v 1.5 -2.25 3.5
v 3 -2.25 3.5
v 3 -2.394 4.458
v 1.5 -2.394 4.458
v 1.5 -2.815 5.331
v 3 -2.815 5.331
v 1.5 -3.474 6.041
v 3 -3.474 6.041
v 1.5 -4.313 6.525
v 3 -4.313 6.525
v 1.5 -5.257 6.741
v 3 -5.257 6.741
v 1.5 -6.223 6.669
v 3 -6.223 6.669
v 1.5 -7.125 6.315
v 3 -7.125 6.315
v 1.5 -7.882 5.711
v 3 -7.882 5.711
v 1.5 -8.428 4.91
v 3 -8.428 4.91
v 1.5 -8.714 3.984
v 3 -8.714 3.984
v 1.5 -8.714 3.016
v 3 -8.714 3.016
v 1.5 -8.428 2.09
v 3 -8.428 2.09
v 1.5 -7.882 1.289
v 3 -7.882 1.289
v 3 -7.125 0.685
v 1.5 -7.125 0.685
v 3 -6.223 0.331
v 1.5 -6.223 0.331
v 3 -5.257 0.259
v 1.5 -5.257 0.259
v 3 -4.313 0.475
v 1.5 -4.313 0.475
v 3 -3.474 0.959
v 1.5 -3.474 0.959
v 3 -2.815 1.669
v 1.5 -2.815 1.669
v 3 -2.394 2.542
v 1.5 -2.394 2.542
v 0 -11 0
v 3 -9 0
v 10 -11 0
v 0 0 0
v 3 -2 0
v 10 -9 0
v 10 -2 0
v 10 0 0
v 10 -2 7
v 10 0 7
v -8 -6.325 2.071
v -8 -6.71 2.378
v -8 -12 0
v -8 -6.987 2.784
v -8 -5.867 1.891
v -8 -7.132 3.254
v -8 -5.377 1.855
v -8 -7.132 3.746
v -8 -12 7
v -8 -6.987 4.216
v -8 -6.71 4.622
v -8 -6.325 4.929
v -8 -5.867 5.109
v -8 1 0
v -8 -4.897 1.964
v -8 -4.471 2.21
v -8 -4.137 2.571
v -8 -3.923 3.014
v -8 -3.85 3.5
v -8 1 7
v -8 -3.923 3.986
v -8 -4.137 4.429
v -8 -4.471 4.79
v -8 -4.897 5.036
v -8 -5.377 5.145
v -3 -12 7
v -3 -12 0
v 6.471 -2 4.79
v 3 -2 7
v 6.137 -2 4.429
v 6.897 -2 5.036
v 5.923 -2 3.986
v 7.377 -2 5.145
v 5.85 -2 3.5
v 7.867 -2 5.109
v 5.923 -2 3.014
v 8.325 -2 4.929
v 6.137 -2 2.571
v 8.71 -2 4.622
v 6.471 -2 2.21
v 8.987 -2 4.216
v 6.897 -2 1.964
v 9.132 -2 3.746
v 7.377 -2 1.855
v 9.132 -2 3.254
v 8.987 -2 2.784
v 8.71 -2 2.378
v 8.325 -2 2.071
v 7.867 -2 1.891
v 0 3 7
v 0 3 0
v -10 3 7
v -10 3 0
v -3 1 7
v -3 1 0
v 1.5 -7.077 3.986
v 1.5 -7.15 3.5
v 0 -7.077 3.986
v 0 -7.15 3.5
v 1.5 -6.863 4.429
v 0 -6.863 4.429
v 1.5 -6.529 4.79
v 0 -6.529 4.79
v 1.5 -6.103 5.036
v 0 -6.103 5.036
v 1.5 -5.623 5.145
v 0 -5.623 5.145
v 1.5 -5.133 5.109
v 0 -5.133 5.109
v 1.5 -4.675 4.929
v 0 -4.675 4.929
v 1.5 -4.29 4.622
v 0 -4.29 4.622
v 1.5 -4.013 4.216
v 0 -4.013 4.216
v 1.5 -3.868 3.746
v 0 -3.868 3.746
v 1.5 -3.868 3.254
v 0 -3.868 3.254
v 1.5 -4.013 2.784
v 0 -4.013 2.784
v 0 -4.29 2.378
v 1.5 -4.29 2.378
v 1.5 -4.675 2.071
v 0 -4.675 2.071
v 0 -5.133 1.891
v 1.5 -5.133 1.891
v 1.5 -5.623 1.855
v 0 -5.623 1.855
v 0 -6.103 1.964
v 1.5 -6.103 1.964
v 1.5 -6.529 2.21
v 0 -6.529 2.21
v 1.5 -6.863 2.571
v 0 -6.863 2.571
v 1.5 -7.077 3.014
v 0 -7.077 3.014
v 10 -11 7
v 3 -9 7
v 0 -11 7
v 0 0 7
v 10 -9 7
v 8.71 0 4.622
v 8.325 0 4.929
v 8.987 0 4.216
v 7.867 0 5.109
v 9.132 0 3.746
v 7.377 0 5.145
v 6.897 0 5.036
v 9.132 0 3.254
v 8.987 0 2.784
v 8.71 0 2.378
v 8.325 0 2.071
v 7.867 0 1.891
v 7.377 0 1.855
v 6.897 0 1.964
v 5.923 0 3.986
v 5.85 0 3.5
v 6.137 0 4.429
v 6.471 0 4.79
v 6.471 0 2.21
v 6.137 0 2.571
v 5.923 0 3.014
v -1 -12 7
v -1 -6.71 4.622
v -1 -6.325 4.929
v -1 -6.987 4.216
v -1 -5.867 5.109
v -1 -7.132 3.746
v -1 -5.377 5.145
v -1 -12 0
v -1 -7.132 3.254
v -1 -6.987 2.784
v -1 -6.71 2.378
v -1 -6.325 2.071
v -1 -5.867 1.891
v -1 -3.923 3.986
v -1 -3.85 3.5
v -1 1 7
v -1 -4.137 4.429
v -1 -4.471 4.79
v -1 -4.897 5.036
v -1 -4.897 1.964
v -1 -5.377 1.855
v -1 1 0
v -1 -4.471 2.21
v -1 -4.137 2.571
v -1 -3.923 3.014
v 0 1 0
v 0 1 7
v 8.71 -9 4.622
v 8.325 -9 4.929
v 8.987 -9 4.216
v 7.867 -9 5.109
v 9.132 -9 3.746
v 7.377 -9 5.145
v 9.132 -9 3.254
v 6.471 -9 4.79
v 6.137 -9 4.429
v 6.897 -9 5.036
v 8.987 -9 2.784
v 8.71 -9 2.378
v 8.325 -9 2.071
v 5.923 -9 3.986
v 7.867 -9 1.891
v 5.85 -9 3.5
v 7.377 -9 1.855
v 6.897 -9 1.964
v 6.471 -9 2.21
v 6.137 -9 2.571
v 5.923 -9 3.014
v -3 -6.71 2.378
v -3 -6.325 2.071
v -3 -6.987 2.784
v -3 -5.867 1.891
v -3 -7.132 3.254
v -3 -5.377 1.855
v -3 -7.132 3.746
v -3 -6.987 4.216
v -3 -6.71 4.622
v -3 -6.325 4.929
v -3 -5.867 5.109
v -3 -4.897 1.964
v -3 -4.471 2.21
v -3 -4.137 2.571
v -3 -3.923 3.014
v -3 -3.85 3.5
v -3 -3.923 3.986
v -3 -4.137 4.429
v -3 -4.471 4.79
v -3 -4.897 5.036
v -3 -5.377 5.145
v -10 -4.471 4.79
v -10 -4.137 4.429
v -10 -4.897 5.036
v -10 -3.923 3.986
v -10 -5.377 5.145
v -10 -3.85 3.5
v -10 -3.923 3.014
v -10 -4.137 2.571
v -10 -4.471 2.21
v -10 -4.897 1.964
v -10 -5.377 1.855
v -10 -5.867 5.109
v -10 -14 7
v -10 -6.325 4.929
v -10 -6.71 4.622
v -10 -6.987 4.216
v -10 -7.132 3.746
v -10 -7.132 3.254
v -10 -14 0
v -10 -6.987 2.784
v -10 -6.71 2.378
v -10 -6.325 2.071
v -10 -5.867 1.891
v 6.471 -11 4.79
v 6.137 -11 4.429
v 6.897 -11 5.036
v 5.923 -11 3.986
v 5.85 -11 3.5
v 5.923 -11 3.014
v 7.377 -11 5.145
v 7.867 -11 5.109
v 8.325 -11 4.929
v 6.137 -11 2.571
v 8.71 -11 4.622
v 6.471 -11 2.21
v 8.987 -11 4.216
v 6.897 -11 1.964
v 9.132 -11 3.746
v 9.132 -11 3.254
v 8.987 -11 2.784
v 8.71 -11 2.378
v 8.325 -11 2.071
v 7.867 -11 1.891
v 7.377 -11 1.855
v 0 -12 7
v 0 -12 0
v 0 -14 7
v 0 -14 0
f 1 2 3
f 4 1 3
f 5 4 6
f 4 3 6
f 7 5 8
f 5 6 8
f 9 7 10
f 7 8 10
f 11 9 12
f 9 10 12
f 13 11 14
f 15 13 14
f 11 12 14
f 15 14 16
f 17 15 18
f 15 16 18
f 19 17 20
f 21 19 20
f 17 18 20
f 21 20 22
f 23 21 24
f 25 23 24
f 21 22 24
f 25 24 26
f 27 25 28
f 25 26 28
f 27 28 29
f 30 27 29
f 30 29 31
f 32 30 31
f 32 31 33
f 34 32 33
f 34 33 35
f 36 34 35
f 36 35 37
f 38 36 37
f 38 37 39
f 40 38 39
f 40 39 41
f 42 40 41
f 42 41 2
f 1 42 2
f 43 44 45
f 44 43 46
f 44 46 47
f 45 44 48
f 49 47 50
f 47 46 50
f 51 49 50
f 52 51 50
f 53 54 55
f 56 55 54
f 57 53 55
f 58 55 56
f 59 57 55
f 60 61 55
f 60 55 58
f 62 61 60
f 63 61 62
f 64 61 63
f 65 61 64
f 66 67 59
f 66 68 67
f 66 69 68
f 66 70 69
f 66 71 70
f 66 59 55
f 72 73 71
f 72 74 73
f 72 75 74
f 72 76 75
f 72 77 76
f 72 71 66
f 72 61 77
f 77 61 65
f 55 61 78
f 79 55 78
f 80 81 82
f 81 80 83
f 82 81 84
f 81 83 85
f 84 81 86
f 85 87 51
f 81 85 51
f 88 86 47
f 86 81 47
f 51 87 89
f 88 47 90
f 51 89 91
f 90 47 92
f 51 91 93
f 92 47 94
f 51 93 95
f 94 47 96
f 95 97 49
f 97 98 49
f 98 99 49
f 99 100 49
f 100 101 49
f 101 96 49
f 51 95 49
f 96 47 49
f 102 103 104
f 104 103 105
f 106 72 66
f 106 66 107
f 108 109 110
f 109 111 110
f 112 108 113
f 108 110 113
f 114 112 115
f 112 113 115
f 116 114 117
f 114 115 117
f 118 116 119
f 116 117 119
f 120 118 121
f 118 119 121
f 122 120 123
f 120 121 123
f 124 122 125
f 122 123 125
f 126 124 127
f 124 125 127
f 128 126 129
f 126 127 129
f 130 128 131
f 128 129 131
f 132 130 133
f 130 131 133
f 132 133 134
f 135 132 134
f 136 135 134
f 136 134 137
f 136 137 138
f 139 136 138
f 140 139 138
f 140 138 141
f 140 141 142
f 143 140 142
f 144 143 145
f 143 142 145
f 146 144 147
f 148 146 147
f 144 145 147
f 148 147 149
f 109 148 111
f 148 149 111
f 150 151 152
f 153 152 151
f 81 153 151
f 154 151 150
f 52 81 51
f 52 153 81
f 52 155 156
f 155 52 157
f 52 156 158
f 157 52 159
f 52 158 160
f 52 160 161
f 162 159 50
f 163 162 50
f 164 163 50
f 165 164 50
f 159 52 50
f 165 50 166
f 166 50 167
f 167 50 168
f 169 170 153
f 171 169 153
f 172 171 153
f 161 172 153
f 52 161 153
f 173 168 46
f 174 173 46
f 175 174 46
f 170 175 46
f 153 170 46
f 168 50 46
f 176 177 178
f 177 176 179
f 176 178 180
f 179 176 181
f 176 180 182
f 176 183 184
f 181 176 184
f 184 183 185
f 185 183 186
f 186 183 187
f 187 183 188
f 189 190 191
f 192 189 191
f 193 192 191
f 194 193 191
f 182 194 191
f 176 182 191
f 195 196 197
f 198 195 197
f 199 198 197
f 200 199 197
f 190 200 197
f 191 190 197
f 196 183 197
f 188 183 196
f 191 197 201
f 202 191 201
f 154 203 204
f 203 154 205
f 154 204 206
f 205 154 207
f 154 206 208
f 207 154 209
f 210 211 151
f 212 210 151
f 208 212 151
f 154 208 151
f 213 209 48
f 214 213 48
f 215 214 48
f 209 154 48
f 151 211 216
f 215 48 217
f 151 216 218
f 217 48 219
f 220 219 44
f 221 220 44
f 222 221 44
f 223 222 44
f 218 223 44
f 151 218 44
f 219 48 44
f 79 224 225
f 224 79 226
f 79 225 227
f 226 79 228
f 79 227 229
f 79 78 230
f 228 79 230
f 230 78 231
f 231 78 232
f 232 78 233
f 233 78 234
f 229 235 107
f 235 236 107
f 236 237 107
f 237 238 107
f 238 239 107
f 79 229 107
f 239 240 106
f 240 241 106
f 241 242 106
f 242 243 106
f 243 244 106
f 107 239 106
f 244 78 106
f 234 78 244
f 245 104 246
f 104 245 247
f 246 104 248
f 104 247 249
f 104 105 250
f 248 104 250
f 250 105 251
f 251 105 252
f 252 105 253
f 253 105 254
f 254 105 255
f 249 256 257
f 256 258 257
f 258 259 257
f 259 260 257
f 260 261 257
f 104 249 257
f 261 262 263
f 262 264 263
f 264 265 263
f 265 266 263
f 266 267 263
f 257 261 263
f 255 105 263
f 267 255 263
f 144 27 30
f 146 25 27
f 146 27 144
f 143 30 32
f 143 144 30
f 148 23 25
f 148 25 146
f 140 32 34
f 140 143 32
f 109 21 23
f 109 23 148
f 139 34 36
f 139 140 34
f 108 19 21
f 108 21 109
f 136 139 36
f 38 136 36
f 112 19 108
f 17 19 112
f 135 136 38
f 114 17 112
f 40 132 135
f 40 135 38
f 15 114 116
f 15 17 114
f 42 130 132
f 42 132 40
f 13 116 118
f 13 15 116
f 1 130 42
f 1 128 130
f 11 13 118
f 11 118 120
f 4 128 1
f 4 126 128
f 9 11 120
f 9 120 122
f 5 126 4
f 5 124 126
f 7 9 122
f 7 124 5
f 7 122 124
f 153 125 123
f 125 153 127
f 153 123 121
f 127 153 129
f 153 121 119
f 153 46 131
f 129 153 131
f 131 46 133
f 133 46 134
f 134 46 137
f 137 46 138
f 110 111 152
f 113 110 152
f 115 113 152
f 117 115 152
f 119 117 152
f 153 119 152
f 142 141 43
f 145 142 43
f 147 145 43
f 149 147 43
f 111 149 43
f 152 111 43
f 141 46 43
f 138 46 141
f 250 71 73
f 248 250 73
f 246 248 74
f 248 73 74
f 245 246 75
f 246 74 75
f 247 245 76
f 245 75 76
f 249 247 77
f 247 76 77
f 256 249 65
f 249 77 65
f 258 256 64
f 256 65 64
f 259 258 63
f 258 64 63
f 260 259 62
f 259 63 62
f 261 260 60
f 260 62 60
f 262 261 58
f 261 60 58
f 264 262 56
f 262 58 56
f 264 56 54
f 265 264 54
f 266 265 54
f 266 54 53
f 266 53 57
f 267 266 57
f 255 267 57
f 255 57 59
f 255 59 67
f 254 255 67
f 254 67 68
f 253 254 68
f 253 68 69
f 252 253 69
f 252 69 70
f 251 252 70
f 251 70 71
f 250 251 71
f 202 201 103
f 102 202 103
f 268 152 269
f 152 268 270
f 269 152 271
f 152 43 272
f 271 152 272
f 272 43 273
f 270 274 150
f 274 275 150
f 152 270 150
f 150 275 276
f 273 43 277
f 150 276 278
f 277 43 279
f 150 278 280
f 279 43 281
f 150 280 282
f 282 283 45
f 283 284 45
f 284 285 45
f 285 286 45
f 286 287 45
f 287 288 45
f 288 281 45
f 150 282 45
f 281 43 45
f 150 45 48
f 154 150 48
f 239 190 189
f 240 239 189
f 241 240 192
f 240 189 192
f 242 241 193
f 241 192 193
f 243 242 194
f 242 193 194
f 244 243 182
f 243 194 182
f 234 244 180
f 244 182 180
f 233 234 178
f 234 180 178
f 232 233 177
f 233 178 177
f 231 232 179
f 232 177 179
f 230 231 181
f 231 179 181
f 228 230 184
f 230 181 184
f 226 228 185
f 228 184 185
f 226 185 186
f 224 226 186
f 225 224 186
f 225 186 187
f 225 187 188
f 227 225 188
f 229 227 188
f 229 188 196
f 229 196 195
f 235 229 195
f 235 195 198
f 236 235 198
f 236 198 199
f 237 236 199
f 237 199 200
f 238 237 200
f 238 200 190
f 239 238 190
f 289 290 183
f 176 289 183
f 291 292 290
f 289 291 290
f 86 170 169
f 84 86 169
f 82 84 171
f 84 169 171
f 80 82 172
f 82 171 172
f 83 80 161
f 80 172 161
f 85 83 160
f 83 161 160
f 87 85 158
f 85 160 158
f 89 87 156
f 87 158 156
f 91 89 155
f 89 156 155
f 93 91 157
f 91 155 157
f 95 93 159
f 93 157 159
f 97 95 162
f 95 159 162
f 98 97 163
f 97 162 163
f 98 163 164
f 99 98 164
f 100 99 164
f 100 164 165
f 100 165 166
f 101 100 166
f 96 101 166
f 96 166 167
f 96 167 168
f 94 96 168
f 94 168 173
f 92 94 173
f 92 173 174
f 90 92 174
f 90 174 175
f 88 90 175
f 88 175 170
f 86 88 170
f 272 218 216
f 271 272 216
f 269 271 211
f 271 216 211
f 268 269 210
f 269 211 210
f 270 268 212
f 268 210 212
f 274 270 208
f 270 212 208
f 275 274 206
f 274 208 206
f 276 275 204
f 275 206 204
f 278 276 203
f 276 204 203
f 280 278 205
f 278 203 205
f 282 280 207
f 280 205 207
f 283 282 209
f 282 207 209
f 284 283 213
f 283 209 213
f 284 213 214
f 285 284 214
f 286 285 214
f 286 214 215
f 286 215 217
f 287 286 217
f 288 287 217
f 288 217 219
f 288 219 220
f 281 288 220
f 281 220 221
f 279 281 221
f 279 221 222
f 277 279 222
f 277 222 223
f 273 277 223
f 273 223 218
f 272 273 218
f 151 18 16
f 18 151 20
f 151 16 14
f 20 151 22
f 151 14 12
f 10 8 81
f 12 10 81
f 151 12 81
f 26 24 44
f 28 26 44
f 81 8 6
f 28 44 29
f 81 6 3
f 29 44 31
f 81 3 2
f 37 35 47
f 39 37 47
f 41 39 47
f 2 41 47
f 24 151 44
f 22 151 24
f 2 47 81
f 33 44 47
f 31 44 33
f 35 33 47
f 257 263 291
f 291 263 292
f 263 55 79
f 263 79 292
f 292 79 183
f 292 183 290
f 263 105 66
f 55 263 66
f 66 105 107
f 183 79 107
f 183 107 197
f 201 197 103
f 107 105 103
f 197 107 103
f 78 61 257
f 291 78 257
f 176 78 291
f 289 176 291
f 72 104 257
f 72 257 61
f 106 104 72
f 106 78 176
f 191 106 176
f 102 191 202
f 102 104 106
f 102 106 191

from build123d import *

# Parameters (mm, degrees)
F1_DEPTH       = 7
F3_D           = 3.3
F5_D           = 3.3
F5_CBORE_D     = 6.5
F5_CBORE_DEPTH = 1.5
F7_DEPTH       = 7
F8_W           = 5
F8_H           = 13
F9_DEPTH       = 7.001
F11_D          = 3.3


with BuildPart() as f1:
    # F0 (on Top) → F1 (new body)
    with BuildSketch(Plane.XY):
        Polygon((10, 0), (0, 0), (0, -11), (10, -11), (10, -9), (3, -9), (3, -2), (10, -2), align=None)
    extrude(amount=F1_DEPTH)

    # F3 (through all)
    with Locations(Plane.XZ.offset(11)):
        with Locations((7.5, 3.5)):
            Hole(F3_D / 2)

    # F5 (through all)
    with Locations(Plane.YZ.offset(3)):
        with Locations((-5.5, 3.5)):
            CounterBoreHole(F5_D / 2, F5_CBORE_D / 2, F5_CBORE_DEPTH)


with BuildPart() as f7:
    # F6 (on Top) → F7 (new body)
    with BuildSketch(Plane.XY):
        Polygon((-1, 1), (0, 1), (0, 3), (-10, 3), (-10, -14), (0, -14), (0, -12), (-1, -12), align=None)
    extrude(amount=F7_DEPTH)

    # F8 (on face) → F9 (cut, through all)
    with BuildSketch(Plane.XY.offset(7)):
        with Locations((-5.5, -5.5)):
            Rectangle(F8_W, F8_H)
    extrude(amount=-F9_DEPTH, mode=Mode.SUBTRACT)

    # F11 (through all)
    with Locations(Plane(origin=(-10, 0, 0), x_dir=(0, -1, 0), z_dir=(-1, 0, 0))):
        with Locations((5.5, 3.5)):
            Hole(F11_D / 2)


solid = Compound([f1.part, f7.part])
